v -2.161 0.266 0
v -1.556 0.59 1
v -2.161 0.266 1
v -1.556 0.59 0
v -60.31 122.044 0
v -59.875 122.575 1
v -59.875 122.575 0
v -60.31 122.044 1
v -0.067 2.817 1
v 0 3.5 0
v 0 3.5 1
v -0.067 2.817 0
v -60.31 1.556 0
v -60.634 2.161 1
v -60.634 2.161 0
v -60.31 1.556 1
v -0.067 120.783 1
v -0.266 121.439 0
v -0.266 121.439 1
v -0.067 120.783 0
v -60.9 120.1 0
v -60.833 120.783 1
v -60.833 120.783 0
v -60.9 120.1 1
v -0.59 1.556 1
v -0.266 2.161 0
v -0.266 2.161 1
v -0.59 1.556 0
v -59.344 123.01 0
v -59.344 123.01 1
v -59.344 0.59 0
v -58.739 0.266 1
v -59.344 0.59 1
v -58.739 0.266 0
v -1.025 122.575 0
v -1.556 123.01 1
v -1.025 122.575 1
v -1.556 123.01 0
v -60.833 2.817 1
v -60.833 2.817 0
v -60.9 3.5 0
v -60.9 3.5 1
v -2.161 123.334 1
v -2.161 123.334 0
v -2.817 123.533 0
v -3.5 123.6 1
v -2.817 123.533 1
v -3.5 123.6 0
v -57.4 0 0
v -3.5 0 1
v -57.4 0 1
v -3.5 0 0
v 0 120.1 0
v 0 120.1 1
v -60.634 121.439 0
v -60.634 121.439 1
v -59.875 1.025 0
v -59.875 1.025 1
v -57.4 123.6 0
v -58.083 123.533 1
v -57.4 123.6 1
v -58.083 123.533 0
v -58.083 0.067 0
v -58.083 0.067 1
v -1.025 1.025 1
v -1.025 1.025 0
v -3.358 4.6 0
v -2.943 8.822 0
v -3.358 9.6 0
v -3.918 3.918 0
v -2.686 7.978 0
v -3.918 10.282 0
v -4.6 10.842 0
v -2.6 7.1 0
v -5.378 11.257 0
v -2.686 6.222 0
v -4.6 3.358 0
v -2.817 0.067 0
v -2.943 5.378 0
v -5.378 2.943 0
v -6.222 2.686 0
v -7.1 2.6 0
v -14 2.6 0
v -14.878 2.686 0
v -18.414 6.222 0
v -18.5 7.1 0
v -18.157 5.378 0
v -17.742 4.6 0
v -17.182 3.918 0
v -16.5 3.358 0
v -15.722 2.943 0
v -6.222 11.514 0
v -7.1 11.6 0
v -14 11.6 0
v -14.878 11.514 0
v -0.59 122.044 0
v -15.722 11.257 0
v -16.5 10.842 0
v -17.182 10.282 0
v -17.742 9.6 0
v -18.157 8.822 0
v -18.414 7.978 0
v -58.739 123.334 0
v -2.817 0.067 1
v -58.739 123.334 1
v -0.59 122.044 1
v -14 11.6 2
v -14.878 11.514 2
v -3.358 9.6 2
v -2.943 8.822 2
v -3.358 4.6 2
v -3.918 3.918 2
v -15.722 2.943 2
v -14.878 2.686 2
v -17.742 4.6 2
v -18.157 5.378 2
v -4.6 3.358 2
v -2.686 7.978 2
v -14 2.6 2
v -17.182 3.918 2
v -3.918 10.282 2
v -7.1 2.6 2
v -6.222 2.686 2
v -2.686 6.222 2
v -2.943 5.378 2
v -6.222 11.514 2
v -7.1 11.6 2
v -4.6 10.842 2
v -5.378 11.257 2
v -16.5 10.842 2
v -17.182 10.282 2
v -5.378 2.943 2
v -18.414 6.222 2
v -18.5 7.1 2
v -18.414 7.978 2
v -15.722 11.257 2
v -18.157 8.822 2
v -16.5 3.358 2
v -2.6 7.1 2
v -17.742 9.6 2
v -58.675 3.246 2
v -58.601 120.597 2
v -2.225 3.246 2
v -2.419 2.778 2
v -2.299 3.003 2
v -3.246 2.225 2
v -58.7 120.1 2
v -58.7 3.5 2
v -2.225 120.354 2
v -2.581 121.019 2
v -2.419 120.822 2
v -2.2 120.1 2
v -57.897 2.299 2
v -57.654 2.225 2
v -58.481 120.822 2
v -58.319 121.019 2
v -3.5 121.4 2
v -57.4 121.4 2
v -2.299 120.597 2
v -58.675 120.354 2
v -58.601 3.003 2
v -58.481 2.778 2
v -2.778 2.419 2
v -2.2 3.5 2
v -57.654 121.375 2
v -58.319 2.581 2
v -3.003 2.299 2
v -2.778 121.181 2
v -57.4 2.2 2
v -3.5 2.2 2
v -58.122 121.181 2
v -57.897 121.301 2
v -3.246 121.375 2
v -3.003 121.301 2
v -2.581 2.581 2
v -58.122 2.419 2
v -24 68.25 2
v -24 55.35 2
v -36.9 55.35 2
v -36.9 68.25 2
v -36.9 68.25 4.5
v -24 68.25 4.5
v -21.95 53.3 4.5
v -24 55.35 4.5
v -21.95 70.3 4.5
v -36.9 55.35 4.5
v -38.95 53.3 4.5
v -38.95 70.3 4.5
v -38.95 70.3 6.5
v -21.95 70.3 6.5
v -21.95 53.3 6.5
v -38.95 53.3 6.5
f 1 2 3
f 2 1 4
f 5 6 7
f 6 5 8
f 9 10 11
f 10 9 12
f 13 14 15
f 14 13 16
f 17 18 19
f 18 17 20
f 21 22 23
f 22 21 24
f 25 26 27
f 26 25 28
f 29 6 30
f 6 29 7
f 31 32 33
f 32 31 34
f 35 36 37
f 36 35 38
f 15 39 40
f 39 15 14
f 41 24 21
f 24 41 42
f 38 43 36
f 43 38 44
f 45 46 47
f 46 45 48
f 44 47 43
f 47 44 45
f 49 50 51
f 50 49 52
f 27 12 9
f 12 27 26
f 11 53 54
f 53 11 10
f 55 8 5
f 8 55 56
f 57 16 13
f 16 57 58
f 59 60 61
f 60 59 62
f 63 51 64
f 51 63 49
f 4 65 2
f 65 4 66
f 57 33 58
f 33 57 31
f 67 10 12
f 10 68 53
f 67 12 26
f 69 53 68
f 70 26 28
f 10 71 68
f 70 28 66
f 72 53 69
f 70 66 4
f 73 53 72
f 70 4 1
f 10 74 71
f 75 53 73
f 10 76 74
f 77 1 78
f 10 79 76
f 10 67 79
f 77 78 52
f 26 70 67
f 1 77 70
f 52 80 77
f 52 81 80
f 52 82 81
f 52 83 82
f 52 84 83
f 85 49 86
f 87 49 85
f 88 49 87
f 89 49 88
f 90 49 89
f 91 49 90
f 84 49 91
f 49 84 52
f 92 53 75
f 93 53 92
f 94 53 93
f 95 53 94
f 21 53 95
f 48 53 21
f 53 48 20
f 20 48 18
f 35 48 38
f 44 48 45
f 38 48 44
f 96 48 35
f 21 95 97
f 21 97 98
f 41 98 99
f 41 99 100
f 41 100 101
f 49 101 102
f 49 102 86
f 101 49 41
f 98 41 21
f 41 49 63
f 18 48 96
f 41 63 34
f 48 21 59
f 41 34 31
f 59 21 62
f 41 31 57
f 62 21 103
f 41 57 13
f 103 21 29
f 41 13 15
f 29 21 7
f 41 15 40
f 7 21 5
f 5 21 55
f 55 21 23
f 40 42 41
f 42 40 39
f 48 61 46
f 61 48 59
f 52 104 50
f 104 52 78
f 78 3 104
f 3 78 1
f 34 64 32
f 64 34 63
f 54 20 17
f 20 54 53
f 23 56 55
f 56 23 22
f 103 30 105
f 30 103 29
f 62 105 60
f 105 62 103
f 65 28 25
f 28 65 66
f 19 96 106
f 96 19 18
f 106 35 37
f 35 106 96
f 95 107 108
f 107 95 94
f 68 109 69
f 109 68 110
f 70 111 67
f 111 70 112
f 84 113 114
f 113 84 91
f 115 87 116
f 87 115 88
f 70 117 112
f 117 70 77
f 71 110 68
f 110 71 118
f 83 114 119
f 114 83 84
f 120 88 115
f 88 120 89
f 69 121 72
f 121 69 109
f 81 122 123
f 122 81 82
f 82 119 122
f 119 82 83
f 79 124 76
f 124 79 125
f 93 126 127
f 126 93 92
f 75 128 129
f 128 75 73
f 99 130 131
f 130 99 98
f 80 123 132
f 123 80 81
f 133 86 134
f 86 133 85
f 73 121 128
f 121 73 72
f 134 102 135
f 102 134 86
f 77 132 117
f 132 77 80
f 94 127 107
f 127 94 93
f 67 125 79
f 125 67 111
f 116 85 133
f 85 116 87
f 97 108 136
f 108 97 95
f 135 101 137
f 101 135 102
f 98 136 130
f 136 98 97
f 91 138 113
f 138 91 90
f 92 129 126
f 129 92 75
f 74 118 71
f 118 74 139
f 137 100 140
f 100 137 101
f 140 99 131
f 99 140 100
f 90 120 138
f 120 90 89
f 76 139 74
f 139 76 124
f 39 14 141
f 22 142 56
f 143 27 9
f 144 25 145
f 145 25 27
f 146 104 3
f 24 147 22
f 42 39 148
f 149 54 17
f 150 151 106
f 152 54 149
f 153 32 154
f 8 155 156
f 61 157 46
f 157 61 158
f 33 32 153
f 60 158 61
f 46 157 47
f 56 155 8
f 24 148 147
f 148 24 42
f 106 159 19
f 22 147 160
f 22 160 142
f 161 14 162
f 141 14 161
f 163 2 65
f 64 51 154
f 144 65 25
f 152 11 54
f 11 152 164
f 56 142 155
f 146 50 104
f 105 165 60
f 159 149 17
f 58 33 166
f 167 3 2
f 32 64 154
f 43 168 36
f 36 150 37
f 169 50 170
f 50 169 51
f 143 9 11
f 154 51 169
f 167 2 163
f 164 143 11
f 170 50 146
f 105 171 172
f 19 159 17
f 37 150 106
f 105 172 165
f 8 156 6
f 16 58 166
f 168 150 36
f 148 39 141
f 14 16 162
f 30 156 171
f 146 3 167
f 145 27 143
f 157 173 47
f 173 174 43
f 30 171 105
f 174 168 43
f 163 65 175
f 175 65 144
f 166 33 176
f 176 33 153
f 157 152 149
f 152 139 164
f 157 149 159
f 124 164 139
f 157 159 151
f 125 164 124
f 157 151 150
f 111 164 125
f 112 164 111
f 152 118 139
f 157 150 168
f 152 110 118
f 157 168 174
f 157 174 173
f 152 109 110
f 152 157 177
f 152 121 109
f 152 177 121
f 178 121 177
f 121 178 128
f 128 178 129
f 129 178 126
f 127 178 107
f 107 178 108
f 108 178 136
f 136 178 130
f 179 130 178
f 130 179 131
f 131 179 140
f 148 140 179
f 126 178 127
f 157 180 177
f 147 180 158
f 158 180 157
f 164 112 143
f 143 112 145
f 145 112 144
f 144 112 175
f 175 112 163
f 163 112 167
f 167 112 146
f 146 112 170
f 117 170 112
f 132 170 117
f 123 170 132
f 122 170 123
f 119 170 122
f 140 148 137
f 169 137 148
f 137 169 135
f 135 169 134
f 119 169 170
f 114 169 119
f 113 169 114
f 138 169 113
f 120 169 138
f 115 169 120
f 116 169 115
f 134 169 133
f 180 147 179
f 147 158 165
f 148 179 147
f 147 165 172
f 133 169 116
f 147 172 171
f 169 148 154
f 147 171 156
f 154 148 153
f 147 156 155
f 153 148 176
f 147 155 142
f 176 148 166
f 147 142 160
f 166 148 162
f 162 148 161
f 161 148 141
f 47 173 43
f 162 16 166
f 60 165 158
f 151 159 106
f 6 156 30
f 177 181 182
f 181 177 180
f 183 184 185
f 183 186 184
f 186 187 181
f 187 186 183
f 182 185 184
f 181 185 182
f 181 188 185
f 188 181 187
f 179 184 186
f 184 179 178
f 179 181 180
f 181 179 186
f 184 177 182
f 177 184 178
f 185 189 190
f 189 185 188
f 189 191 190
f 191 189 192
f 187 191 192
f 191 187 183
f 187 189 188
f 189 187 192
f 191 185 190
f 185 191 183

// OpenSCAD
// https://en.wikibooks.org/wiki/OpenSCAD_User_Manual/Tips_and_Tricks#Add_all_values_in_a_list
function add2(v) = [for(p=v) 1] * v;
function mean(v) = add2(v) / len(v);

nutHoleRadius = 6.6/2;
tolerance=0.3;

cornerRadius = 3.5;
length=mean([120.4-tolerance]);
width=mean([57.7-tolerance]);

module lensHole() {
  $fn=32;
  depth=1;
  
  hull() {
    // camera + led hole
    translate([4.5+2.6,2.6+4.5,-1])
    cylinder(r=4.5, h=depth+2);
    // camera hole
    translate([4.5+2.6,14,-1])
    cylinder(r=4.5, h=depth+2);
  }
}

module backPlateL1() {
  $fn=32;
  depth=1;
  
  /**
  
    A --- B
    |     |
    D --- C
  
  **/
  
  difference() {
    linear_extrude(height=depth)
    hull() {
      // D
      translate([cornerRadius,cornerRadius])
      circle(cornerRadius);
      
      // C
      translate([length,cornerRadius])
      circle(cornerRadius);

      // B
      translate([length,width])
      circle(cornerRadius);
      
      // A
      translate([cornerRadius,width])
      circle(cornerRadius);    
    }
    
    lensHole();
  }
}


module backPlateL2() {
  $fn=32;
  depth=1;
  
  /**
  
    A --- B
    |     |
    D --- C
  
  **/
  r2diff = 2.2;
  
  difference() {
    hull() {
      // D
      translate([cornerRadius,cornerRadius])
      cylinder(r1=cornerRadius,r2=cornerRadius-r2diff, height=depth);
      
      // C
      translate([length,cornerRadius])
      cylinder(r1=cornerRadius,r2=cornerRadius-r2diff, height=depth);

      // B
      translate([length,width])
      cylinder(r1=cornerRadius,r2=cornerRadius-r2diff, height=depth);
      
      // A
      translate([cornerRadius,width])
      cylinder(r1=cornerRadius,r2=cornerRadius-r2diff, height=depth);
    }
    
    lensHole();
  }
}

module main() {
  cubeRadius = 1.2;
  cubeSize = 9-tolerance+0.06;
  cornerCutSize = 1.4;
  
  pegSize = [12.9,12.9,2.5];
  topSize = [17,17,2];
  
  rotate([0,0,90])  {
    union(){
      backPlateL1();
      translate([0,0,1])
        backPlateL2();

      // square insert
      translate([0,0,2])
      translate([length+cornerRadius,width+cornerRadius,0]*0.5)
      translate([0,0,pegSize[2]]*.5)
      translate(pegSize*-.5)
      cube(pegSize);

      // square insert top
      translate([0,0,2+2.5])
      translate([length+cornerRadius,width+cornerRadius,0]*0.5)
      translate([0,0,topSize[2]]*.5)
      translate(topSize*-.5)
      cube(topSize);

    }      
  }
}

main();
